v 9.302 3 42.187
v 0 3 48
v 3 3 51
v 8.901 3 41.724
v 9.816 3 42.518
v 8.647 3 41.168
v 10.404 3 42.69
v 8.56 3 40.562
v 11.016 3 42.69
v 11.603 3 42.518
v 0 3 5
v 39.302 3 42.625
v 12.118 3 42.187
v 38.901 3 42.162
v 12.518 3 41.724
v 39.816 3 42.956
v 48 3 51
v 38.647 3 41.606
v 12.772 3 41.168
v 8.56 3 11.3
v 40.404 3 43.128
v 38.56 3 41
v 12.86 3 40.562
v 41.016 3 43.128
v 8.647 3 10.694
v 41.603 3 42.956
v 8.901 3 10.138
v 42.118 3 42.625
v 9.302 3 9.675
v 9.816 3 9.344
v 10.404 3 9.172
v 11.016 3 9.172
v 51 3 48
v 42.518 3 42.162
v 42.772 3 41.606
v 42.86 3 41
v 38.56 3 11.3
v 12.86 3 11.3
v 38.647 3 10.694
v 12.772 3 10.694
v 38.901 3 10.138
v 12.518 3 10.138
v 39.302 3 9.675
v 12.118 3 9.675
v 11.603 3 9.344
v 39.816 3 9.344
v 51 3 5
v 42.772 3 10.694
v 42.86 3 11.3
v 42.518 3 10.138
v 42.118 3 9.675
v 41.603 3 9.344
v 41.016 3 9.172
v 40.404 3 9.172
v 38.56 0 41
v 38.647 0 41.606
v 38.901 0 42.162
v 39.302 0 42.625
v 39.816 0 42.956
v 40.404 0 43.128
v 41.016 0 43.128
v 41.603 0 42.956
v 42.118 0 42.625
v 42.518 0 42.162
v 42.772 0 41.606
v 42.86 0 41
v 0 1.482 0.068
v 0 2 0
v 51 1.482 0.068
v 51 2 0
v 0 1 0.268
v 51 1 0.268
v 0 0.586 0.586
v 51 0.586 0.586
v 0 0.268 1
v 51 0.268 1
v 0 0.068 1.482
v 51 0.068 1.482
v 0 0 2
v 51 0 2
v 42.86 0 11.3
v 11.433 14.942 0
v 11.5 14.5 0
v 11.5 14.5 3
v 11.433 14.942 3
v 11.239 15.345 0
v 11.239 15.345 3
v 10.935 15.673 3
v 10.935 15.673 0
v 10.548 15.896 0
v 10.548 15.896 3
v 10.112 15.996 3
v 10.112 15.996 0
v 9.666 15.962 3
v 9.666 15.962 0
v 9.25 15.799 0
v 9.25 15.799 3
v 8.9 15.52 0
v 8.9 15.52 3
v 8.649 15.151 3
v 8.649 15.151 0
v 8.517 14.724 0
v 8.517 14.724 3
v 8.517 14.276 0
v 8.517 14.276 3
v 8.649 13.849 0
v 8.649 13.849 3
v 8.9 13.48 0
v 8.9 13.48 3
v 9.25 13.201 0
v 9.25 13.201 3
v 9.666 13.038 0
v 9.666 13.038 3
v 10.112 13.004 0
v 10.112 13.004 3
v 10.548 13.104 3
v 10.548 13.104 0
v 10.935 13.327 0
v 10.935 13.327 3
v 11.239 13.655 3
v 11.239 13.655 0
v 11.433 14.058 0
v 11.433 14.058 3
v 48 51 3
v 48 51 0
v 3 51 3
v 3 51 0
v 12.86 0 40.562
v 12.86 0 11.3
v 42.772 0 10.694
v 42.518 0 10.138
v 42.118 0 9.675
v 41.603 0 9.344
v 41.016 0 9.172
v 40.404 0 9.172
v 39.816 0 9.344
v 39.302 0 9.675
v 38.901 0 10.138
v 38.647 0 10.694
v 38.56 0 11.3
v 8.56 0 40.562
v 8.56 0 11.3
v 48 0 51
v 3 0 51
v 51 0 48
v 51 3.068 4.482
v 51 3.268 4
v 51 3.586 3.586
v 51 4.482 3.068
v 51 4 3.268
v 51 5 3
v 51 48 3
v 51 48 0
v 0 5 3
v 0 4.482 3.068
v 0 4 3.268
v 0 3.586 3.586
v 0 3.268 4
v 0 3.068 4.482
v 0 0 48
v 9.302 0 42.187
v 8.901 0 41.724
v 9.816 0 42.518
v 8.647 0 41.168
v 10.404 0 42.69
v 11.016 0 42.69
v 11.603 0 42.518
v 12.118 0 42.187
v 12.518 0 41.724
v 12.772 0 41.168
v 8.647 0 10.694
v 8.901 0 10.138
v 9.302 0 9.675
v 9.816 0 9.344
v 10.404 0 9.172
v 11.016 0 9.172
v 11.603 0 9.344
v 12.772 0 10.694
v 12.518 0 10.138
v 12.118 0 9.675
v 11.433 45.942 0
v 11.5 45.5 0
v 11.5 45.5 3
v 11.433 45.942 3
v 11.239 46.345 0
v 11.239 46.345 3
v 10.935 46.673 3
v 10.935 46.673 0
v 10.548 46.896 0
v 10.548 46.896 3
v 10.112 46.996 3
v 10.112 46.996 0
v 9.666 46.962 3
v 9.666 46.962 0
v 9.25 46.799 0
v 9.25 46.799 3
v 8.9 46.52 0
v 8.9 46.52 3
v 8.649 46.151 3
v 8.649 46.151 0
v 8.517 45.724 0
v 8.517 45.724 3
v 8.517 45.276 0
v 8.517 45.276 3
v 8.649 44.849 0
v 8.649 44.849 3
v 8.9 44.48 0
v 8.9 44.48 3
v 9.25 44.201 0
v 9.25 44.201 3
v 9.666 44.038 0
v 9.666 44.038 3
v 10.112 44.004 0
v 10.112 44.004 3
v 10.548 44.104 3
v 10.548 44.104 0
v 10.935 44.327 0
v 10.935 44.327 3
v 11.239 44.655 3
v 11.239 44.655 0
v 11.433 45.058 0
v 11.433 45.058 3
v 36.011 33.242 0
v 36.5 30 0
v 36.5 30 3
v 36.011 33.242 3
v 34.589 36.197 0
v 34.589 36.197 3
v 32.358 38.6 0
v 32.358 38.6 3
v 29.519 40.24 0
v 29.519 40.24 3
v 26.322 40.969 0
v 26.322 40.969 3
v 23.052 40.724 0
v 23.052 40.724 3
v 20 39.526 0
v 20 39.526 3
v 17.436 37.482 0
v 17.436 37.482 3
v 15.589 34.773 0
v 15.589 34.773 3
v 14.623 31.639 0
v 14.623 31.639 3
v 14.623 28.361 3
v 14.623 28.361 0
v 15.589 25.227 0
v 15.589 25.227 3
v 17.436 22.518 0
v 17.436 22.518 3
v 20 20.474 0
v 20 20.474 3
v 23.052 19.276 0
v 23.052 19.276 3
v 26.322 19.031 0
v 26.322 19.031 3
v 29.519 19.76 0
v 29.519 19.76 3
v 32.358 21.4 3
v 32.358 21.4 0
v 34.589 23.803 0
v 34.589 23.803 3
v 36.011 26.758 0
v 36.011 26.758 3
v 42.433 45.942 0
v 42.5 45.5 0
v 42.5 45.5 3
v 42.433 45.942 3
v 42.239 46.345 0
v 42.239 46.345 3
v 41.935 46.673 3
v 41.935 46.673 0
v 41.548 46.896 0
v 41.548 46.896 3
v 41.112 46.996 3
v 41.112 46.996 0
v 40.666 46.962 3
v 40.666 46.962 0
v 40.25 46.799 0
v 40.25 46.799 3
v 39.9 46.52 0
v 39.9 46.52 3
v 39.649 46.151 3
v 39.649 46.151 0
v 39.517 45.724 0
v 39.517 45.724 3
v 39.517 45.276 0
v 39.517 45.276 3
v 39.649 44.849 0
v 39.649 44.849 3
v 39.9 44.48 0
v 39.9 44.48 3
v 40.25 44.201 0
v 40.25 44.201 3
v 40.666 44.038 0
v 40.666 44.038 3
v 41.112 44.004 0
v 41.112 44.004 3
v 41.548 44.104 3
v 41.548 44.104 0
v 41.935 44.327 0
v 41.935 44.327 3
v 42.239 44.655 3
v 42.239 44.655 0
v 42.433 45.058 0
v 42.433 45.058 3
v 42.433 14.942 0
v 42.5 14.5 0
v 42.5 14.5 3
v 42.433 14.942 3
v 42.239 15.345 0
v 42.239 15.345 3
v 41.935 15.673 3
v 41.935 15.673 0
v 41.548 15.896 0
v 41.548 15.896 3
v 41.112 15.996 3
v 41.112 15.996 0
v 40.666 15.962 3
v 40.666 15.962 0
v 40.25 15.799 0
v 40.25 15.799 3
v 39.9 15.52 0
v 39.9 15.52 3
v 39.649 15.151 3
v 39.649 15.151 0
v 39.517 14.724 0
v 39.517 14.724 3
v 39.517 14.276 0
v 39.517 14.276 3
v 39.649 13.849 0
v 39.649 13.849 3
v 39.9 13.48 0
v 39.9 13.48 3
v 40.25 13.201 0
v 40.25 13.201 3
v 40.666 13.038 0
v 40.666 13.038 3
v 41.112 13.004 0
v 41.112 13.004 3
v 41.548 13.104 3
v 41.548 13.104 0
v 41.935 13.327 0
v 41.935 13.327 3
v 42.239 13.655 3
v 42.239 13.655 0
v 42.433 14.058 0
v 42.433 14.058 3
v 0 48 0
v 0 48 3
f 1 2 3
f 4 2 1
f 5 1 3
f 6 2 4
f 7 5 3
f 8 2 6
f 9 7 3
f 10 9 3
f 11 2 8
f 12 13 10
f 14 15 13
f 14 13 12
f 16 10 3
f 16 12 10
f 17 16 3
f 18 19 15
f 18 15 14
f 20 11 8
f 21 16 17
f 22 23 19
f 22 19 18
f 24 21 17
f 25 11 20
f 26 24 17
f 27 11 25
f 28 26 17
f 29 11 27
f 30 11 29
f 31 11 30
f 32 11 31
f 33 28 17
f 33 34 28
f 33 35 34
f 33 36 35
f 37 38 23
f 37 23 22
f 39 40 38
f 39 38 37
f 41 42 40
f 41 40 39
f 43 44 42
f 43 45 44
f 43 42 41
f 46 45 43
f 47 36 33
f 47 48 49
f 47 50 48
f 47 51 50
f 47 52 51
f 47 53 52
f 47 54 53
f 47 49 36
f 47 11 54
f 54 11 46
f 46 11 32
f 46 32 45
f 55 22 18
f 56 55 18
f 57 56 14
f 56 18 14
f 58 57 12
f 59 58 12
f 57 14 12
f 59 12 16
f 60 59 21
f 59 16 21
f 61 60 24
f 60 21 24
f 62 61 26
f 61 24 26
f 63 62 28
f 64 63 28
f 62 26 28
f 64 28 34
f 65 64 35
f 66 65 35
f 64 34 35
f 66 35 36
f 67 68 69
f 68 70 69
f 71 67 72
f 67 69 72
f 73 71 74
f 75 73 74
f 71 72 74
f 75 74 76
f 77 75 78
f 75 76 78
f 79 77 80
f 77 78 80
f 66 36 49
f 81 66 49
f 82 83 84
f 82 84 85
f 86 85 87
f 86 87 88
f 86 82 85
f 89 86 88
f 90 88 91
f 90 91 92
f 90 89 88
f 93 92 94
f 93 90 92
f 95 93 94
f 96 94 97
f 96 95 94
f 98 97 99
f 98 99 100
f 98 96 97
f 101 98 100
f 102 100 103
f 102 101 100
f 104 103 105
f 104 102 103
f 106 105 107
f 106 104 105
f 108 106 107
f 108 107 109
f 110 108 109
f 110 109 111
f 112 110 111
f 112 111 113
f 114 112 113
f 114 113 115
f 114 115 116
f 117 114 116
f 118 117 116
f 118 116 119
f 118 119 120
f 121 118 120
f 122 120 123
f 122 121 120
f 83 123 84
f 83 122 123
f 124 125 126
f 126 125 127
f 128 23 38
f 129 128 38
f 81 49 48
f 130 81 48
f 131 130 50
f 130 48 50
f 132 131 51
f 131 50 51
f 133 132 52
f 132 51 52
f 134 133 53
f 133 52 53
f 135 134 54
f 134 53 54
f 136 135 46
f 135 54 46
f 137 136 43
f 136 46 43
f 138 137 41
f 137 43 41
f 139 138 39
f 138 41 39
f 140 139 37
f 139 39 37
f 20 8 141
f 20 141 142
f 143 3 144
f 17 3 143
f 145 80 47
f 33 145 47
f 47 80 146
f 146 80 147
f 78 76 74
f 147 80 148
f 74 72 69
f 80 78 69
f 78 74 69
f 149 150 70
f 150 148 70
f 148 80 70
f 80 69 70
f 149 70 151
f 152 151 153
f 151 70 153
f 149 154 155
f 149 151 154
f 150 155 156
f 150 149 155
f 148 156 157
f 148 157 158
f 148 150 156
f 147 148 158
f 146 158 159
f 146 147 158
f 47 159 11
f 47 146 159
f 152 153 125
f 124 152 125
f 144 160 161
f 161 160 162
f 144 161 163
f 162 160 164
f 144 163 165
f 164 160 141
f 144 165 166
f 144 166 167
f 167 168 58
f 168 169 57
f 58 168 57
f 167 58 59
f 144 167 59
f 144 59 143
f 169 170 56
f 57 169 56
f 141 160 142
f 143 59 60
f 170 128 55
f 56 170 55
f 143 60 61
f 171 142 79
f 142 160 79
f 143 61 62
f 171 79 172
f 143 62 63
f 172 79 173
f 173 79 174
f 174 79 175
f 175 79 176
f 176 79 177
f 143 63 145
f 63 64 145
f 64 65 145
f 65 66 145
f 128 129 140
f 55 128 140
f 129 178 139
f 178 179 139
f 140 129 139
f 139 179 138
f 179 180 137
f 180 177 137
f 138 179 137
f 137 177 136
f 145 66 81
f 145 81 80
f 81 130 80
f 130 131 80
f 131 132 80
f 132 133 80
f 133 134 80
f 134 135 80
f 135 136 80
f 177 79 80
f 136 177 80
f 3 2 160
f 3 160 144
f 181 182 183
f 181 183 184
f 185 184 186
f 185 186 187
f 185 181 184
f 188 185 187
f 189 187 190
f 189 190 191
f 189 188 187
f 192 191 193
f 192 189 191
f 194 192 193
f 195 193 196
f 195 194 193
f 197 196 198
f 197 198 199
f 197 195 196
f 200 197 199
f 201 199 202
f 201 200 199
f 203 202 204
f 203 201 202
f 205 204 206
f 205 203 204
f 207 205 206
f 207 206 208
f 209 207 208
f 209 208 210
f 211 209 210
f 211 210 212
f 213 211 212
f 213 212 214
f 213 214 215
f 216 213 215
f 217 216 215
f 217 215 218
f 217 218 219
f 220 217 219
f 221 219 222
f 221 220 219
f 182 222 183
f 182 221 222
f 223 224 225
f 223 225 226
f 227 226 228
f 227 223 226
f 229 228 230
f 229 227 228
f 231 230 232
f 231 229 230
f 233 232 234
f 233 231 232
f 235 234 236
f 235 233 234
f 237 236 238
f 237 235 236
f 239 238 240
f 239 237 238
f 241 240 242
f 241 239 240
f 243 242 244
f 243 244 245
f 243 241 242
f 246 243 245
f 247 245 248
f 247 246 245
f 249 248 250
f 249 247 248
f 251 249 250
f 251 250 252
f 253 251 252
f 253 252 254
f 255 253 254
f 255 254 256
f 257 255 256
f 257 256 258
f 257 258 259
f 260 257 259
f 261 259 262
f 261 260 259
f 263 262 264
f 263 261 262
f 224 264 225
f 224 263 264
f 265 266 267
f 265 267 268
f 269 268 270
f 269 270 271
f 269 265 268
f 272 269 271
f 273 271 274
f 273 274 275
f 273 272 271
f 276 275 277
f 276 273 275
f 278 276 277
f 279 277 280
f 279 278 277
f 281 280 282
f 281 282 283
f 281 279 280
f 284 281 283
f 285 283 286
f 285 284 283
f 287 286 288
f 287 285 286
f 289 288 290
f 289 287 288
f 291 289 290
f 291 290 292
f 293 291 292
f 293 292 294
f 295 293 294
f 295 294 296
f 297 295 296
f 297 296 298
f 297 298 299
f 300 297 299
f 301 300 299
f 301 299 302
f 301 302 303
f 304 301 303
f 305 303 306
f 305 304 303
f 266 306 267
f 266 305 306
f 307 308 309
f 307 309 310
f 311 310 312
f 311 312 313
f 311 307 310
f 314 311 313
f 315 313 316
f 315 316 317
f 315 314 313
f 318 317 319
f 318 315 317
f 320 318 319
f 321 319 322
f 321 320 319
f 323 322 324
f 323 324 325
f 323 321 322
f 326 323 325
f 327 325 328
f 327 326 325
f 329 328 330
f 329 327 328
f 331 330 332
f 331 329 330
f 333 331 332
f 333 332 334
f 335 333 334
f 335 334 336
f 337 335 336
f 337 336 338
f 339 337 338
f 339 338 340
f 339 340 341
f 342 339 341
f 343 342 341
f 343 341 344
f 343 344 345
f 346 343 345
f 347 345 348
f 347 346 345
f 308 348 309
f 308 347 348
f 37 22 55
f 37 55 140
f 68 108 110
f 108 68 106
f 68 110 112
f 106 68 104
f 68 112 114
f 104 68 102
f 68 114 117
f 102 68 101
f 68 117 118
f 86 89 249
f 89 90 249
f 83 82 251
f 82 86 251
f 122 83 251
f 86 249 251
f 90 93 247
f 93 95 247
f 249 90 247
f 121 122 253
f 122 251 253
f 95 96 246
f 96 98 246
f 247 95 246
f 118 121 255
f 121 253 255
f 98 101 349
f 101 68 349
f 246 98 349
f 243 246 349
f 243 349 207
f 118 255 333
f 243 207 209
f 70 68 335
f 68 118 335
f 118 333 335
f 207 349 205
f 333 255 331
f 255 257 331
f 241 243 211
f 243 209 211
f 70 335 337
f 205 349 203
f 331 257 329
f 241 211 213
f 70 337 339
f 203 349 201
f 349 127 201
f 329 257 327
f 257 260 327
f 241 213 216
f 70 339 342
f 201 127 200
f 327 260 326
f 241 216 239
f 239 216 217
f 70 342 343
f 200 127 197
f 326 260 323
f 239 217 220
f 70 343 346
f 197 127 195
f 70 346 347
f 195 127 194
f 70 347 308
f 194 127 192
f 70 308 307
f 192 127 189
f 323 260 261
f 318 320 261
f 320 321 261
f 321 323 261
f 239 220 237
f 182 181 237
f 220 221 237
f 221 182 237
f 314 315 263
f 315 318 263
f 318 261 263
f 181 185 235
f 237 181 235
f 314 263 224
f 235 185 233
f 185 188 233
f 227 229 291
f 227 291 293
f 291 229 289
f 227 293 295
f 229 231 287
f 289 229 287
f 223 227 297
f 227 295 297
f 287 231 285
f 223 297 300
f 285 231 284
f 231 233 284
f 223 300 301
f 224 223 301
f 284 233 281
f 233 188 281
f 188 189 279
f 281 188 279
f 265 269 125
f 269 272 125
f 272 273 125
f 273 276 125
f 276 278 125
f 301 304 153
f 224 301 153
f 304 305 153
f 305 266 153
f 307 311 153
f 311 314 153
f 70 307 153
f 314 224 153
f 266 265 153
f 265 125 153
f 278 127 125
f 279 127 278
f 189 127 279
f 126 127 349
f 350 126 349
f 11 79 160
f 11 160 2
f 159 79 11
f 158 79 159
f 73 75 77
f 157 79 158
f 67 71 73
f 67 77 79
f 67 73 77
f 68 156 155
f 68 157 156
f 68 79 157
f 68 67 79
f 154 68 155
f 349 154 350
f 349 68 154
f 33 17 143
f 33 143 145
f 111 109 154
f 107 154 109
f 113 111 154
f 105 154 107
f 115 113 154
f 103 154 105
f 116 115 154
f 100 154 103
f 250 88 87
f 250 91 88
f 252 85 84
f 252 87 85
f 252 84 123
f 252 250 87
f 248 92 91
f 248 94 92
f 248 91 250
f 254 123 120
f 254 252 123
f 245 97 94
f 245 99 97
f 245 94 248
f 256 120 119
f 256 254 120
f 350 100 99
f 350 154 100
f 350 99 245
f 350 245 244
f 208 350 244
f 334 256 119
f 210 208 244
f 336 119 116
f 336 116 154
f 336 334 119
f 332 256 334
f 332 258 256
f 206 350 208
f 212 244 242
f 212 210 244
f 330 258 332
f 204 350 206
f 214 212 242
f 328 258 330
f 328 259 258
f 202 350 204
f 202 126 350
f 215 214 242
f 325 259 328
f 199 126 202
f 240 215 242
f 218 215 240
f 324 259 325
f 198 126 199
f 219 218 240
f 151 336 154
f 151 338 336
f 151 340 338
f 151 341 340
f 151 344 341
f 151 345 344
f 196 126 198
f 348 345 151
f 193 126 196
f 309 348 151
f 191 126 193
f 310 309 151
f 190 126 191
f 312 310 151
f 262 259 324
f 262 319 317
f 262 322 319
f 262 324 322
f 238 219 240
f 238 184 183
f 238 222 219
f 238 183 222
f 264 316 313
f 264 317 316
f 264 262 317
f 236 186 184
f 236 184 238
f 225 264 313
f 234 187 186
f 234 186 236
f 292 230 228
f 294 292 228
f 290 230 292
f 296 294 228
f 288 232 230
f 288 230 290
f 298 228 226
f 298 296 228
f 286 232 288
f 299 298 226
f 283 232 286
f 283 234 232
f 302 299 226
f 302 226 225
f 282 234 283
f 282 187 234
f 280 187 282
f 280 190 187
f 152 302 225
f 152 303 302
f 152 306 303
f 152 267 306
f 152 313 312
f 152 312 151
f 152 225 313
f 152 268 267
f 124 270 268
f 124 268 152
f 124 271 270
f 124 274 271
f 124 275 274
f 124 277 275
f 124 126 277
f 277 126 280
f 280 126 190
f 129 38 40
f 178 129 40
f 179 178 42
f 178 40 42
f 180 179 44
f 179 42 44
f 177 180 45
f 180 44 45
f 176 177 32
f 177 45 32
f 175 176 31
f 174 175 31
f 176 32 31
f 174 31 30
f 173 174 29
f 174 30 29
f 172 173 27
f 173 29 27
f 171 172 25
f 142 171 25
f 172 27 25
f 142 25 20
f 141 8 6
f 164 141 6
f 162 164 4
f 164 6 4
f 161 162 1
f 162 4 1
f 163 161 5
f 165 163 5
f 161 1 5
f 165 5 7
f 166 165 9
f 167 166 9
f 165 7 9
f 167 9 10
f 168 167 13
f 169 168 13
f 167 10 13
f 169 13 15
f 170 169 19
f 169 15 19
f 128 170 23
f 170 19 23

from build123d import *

# Parameters (mm, degrees)
SKETCH_R     = 11
SKETCH_R_2   = 1.5
PAD_DEPTH    = 3
SKETCH001_W  = 51
SKETCH001_H  = 3
PAD001_DEPTH = 48
POCKET_DEPTH = 5
FILLET_R     = 2
FILLET001_R  = 2


with BuildPart() as part:
    # Sketch → Pad (new body)
    with BuildSketch(Plane.XY):
        Polygon((0, 0), (51, 0), (51, 48), (48, 51), (3, 51), (0, 48), align=None)
        with Locations((25.5, 30)):
            Circle(SKETCH_R, mode=Mode.SUBTRACT)
        with Locations((10, 45.5)):
            Circle(SKETCH_R_2, mode=Mode.SUBTRACT)
        with Locations((10, 14.5)):
            Circle(SKETCH_R_2, mode=Mode.SUBTRACT)
        with Locations((41, 14.5)):
            Circle(SKETCH_R_2, mode=Mode.SUBTRACT)
        with Locations((41, 45.5)):
            Circle(SKETCH_R_2, mode=Mode.SUBTRACT)
    extrude(amount=PAD_DEPTH)

    # Sketch001 (on Face13 of Pad) → Pad001 (join)
    with BuildSketch(Plane.XY.offset(3)):
        with Locations((25.5, 1.5)):
            Rectangle(SKETCH001_W, SKETCH001_H)
    extrude(amount=PAD001_DEPTH)

    # Sketch002 (on Face18 of Pad001) → Pocket (cut)
    with BuildSketch(Plane(origin=(0, 3, 0), x_dir=(-1, 0, 0), z_dir=(0, 1, 0))):
        Polygon((-51, 48), (-51, 51), (-48, 51), align=None)
        Polygon((-3, 51), (0, 51), (0, 48), align=None)
        with BuildLine():
            ThreePointArc((-38.55959, 41), (-40.70959, 43.15), (-42.85959, 41))
            Line((-42.85959, 41), (-42.85959, 11.3))
            ThreePointArc((-42.85959, 11.3), (-40.70959, 9.15), (-38.55959, 11.3))
            Line((-38.55959, 41), (-38.55959, 11.3))
        make_face()
        with BuildLine():
            ThreePointArc((-8.55959, 40.561928), (-10.70959, 42.711928), (-12.85959, 40.561928))
            Line((-12.85959, 40.561928), (-12.85959, 11.3))
            ThreePointArc((-12.85959, 11.3), (-10.70959, 9.15), (-8.55959, 11.3))
            Line((-8.55959, 40.561928), (-8.55959, 11.3))
        make_face()
    extrude(amount=-POCKET_DEPTH, mode=Mode.SUBTRACT)

    # Fillet
    fillet_edges = [part.edges().sort_by_distance(p)[0] for p in [
        (25.5, 3, 3),
    ]]
    fillet(fillet_edges, radius=FILLET_R)

    # Fillet001
    fillet001_edges = [part.edges().sort_by_distance(p)[0] for p in [
        (25.5, 0, 0),
    ]]
    fillet(fillet001_edges, radius=FILLET001_R)


solid = part.part
